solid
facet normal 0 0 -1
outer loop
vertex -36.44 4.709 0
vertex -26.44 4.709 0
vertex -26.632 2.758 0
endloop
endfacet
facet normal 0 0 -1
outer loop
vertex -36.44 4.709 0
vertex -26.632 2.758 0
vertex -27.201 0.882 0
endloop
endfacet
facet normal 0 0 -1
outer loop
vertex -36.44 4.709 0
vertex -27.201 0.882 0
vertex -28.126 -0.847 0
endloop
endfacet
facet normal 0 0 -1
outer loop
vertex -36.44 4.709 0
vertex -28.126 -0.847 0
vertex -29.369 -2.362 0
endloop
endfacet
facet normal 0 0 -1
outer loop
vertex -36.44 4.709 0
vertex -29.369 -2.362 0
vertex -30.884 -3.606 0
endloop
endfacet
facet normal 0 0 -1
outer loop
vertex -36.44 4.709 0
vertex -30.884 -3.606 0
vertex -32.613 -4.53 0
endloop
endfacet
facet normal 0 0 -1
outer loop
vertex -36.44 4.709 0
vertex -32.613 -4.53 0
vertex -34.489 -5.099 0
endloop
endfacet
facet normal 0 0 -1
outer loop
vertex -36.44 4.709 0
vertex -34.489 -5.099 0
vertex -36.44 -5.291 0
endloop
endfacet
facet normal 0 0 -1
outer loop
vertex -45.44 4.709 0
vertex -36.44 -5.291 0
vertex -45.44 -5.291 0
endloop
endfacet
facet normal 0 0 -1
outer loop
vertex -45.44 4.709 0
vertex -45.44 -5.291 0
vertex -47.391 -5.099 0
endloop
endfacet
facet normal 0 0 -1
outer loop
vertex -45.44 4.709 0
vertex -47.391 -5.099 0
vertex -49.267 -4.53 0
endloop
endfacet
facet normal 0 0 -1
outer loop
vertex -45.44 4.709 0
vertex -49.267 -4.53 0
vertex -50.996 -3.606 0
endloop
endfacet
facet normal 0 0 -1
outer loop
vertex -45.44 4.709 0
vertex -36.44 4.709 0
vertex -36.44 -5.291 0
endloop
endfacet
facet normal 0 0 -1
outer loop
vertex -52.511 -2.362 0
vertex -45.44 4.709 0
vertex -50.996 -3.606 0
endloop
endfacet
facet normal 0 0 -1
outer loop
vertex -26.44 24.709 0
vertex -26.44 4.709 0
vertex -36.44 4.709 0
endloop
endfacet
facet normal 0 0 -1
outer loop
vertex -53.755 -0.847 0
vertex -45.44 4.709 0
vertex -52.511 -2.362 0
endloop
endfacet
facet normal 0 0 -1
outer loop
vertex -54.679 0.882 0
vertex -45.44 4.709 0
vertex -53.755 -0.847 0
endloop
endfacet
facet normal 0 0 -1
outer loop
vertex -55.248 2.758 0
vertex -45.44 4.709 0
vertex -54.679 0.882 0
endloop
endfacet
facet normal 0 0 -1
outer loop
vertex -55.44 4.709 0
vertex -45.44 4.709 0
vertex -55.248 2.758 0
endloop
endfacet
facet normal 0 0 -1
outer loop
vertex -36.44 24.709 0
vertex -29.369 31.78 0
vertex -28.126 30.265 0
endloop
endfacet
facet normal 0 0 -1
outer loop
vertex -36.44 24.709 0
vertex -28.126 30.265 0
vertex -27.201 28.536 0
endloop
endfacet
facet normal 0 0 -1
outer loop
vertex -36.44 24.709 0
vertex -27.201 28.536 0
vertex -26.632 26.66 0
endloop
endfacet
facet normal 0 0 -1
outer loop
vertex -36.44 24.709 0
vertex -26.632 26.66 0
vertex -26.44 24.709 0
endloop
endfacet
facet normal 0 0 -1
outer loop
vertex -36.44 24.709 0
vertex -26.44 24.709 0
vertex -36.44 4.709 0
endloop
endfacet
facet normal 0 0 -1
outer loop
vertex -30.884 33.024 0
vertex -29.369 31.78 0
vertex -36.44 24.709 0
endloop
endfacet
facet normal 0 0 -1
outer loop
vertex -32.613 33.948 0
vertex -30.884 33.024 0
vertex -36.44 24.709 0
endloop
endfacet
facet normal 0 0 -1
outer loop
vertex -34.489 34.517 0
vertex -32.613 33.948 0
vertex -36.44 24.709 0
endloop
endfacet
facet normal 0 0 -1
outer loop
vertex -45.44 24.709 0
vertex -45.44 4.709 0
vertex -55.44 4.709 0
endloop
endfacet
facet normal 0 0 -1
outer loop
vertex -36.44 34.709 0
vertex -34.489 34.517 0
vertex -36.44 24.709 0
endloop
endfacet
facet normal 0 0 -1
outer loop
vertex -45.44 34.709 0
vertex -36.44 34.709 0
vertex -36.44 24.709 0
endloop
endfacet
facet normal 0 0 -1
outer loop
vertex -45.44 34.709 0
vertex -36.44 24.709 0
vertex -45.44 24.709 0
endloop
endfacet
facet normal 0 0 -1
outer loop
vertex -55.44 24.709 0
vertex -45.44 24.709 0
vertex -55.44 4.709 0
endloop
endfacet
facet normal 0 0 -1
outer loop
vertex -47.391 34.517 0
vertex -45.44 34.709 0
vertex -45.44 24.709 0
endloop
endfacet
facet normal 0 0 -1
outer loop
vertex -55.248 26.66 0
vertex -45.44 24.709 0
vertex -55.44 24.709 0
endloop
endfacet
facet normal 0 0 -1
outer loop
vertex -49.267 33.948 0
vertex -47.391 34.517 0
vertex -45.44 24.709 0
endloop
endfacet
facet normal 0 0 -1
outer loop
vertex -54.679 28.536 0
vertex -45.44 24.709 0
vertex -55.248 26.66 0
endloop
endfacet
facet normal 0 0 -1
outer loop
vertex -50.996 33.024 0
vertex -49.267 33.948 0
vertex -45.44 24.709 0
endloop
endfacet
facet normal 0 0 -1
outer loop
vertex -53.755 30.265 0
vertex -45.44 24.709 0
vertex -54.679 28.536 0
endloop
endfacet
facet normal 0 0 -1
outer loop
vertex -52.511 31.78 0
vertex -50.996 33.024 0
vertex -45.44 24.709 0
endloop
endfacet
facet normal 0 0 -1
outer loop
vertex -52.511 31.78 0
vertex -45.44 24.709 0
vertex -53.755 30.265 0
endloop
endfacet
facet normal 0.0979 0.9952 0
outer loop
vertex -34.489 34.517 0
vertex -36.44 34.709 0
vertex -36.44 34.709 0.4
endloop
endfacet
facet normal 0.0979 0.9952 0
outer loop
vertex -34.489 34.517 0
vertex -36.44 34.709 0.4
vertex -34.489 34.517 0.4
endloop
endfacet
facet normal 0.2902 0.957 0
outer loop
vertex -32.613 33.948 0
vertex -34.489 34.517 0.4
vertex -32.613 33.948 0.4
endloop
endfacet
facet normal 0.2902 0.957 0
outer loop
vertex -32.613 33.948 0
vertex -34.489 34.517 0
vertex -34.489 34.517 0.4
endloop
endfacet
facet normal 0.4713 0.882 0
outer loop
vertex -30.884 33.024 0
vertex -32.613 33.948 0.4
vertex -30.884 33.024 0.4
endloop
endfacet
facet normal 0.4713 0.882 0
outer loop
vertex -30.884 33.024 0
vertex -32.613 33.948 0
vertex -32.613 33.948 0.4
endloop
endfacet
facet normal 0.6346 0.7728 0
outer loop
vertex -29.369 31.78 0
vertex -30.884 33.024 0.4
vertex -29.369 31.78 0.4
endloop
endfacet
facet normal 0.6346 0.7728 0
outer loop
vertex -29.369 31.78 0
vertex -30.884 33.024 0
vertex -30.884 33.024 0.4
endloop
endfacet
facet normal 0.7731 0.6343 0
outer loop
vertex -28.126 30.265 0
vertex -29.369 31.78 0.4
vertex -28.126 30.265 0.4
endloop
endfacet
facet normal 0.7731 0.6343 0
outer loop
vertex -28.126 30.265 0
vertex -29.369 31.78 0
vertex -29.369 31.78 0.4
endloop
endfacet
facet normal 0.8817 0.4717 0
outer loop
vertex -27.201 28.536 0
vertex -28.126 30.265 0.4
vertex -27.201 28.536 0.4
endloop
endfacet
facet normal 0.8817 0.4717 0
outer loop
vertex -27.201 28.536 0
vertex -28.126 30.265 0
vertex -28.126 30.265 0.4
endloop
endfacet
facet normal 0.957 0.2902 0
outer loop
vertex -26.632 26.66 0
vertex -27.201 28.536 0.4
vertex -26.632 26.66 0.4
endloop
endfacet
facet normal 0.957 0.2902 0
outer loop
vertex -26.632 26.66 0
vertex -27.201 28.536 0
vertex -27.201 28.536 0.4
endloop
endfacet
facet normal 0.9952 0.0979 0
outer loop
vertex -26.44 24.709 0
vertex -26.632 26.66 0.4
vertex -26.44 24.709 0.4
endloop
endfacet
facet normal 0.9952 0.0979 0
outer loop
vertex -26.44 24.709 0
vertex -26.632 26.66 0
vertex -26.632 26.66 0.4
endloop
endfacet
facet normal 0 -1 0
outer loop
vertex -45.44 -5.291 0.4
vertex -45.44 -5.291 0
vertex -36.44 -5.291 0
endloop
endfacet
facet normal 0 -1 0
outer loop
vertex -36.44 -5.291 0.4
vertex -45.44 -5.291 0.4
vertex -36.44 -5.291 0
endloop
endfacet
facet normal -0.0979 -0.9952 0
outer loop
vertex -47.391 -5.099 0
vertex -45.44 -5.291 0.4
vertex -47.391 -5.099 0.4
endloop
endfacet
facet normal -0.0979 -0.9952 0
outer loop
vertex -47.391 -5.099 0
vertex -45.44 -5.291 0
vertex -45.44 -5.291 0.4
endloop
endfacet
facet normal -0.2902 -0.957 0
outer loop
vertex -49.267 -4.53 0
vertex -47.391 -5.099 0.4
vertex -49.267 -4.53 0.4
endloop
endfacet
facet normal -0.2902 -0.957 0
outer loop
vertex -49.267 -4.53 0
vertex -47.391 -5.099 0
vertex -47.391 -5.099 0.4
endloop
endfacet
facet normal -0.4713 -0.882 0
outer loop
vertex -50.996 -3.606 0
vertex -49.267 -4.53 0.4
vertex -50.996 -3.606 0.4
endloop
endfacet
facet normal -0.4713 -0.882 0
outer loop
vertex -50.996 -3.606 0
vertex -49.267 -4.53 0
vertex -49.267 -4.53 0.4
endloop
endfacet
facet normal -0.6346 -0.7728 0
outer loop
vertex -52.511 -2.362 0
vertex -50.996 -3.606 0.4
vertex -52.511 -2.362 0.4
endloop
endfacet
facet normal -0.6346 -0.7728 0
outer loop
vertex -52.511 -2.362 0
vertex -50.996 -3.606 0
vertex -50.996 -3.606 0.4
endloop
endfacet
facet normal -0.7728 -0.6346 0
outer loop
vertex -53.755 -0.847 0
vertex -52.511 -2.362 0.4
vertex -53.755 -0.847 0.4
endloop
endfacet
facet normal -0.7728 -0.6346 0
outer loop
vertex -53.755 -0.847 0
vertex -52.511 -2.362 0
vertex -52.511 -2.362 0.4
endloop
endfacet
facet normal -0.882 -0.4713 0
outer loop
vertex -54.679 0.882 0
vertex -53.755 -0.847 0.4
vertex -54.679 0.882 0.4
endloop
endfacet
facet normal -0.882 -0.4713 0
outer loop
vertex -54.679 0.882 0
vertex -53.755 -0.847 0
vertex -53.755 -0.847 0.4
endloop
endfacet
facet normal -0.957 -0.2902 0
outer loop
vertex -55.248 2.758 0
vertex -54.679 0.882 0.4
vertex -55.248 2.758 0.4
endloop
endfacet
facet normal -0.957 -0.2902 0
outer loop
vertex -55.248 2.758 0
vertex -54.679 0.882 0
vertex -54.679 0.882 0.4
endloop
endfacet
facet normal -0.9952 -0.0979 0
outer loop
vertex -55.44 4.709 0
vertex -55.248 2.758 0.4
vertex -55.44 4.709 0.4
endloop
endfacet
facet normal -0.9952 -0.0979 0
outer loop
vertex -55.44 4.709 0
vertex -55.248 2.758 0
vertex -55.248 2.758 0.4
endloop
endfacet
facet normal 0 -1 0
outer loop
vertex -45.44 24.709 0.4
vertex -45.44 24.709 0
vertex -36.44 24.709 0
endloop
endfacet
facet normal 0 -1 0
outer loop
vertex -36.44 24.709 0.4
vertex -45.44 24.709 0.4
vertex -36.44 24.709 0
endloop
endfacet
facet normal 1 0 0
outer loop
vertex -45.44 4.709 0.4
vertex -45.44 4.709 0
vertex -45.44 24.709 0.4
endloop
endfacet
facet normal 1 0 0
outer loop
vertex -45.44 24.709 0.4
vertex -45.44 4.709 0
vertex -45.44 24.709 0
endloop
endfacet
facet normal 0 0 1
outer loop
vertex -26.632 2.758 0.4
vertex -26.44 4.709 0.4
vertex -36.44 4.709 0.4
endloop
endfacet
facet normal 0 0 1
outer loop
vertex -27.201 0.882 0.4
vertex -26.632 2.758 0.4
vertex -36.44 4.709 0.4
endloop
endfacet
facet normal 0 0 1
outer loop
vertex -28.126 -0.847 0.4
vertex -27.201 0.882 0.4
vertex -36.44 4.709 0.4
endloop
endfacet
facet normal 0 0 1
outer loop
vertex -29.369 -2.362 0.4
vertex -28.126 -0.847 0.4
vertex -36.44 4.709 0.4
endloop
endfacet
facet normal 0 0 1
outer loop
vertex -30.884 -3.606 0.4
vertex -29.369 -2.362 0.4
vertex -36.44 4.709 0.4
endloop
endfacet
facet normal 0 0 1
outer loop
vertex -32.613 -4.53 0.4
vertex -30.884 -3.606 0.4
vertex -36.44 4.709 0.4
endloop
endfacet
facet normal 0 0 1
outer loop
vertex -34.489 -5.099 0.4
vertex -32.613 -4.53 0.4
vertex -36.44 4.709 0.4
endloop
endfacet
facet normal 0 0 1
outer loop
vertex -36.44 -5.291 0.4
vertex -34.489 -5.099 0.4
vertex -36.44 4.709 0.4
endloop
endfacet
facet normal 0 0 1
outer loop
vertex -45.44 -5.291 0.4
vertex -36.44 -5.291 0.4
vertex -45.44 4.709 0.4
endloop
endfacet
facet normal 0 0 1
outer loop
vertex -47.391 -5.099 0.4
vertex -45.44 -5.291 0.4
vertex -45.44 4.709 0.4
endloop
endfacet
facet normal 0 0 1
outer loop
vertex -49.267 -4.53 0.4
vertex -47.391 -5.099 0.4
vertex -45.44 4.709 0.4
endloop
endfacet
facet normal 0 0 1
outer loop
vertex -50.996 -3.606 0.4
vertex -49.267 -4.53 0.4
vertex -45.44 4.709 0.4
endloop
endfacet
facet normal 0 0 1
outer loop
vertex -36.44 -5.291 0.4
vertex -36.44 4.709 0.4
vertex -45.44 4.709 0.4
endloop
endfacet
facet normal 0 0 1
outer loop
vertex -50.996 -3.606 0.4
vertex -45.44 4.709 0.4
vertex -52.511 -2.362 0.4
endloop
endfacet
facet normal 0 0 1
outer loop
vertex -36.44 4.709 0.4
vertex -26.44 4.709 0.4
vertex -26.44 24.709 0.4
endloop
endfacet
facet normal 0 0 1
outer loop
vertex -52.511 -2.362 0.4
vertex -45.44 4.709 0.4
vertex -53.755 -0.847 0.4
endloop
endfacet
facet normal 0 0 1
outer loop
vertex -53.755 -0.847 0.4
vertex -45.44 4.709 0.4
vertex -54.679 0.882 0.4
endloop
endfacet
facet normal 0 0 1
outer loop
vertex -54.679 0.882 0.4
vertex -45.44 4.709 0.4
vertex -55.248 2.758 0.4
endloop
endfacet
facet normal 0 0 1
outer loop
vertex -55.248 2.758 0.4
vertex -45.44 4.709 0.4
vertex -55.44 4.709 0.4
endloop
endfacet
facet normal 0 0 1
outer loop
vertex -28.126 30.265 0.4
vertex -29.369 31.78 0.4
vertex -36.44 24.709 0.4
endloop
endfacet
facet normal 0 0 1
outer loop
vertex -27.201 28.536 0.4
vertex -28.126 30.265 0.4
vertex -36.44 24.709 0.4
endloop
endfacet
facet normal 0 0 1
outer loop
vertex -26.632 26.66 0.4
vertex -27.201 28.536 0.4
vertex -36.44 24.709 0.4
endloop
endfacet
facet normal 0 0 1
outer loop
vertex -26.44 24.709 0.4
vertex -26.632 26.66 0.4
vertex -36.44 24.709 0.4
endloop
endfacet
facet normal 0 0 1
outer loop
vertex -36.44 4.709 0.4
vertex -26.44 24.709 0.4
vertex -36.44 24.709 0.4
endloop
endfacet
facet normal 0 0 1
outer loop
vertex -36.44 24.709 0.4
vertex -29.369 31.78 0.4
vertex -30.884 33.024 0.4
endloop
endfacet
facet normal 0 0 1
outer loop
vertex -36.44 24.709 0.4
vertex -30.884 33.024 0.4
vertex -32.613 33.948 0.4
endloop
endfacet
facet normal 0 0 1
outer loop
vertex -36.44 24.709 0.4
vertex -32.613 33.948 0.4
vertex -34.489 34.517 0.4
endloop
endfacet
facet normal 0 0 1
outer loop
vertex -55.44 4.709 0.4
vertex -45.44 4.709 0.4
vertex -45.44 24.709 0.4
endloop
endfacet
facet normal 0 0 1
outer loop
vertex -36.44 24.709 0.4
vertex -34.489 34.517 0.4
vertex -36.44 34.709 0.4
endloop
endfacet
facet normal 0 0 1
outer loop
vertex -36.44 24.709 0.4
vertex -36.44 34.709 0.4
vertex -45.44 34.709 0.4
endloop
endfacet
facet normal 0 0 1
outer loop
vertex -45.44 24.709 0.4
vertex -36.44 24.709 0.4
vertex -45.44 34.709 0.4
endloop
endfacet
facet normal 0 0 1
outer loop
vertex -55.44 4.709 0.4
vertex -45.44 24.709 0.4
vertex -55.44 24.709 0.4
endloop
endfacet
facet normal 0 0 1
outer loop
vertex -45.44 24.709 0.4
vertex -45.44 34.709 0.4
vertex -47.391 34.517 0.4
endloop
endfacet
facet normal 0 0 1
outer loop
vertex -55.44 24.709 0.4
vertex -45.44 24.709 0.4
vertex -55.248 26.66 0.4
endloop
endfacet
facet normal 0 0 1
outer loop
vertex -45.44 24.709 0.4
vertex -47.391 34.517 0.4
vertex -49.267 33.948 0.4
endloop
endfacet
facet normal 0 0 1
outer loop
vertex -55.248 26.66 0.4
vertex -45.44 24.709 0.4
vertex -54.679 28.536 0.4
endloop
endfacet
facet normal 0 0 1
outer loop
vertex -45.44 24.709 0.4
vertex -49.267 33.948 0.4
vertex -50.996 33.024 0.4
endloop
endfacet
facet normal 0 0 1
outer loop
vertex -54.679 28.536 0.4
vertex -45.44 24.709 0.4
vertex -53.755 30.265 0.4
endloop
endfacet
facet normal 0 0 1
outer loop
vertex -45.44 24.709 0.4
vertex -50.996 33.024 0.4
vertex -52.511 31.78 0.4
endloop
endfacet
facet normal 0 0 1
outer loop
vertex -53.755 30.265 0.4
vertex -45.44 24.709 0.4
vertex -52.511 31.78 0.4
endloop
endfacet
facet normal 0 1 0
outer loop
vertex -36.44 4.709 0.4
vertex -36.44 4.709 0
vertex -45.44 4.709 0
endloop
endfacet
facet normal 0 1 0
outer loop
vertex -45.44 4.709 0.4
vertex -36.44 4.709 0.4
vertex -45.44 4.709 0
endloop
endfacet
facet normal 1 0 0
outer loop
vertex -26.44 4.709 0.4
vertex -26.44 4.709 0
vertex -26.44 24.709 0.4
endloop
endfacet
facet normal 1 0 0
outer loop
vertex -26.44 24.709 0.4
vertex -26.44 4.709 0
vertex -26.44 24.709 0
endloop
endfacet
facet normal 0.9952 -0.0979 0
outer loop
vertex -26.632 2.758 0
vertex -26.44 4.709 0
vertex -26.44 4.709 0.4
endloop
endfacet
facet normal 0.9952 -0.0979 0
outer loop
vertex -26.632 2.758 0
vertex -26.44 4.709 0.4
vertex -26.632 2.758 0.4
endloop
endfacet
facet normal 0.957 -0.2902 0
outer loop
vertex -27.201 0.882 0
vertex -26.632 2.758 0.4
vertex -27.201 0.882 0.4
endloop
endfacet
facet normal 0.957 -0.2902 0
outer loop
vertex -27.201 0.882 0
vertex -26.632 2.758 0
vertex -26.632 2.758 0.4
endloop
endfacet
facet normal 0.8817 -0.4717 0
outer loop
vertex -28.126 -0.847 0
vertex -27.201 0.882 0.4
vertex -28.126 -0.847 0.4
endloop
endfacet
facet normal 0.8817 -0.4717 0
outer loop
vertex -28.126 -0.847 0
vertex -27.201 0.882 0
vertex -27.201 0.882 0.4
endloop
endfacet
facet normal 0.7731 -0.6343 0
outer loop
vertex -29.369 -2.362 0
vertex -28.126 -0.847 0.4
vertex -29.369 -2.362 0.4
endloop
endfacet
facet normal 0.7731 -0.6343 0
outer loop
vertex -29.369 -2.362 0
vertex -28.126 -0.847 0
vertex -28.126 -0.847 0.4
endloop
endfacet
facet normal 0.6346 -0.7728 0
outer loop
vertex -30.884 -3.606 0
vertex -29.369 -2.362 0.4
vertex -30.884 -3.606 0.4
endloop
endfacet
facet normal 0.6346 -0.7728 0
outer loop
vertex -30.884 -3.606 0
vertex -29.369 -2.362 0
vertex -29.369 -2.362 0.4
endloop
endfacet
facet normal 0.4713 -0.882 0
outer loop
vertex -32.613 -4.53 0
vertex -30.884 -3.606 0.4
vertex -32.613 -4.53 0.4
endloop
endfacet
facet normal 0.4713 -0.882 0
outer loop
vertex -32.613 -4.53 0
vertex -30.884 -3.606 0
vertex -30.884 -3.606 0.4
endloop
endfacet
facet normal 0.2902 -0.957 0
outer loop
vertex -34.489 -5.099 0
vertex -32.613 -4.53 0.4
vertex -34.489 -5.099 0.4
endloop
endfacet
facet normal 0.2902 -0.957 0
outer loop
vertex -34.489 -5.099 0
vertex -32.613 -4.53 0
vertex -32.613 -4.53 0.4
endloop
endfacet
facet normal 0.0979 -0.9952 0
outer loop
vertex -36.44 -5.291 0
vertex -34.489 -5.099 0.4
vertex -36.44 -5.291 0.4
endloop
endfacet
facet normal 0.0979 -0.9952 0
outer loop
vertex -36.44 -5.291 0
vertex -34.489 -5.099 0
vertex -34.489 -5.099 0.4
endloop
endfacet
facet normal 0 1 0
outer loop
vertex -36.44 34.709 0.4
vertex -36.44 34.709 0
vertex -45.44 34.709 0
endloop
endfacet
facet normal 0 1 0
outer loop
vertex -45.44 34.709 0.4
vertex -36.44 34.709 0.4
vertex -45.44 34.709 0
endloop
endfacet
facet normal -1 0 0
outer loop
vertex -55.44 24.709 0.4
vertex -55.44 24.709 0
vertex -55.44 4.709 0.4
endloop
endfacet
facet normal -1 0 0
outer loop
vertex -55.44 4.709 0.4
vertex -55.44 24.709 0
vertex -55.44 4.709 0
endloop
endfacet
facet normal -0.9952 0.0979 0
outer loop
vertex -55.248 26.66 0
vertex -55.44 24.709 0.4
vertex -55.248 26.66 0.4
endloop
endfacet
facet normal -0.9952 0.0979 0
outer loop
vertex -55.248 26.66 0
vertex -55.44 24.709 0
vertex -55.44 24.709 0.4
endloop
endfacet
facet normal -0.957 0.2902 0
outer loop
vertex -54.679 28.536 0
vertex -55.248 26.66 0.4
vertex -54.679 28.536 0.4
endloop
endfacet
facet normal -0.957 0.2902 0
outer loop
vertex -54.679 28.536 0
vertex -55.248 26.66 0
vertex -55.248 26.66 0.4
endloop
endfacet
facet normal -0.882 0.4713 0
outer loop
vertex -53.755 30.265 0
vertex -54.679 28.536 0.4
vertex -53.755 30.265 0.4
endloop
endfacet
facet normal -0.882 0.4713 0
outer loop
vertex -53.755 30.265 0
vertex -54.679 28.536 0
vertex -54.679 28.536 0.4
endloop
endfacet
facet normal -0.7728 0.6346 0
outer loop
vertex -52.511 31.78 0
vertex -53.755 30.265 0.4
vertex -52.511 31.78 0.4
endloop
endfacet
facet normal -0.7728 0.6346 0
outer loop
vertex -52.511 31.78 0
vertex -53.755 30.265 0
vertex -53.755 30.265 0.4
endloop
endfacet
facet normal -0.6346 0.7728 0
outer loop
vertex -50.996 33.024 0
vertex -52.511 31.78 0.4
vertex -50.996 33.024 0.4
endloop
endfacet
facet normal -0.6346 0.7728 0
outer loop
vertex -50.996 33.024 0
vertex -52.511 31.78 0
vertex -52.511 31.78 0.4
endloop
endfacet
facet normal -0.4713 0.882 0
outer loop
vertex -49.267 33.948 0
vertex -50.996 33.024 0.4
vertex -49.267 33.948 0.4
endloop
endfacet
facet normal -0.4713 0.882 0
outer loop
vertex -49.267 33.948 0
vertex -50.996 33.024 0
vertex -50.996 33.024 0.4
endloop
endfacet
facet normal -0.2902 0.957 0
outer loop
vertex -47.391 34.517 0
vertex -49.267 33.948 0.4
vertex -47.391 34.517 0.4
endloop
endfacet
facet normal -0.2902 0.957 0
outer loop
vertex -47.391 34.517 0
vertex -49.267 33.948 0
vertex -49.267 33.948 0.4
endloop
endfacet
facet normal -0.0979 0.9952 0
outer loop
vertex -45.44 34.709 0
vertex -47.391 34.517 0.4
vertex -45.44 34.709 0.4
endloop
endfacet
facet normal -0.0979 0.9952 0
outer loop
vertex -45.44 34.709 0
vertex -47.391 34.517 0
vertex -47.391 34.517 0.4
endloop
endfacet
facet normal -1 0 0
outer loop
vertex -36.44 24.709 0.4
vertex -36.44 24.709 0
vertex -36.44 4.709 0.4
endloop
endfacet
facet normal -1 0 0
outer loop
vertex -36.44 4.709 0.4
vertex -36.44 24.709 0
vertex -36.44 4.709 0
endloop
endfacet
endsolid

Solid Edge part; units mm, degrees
sketch "Sketch1" plane through (0, 0, 0) normal (0, 0, 1) x (1, 0, 0)
  arc A0 (-55.4402, 24.709) -> (-45.4402, 34.709) centre (-45.4402, 24.709) cw
  line L0 (-36.4402, 34.709) -> (-45.4402, 34.709)
  arc A1 (-36.4402, 34.709) -> (-26.4402, 24.709) centre (-36.4402, 24.709) cw
  line L1 (-26.4402, 4.709) -> (-26.4402, 24.709)
  arc A2 (-26.4402, 4.709) -> (-36.4402, -5.291) centre (-36.4402, 4.709) cw
  line L2 (-45.4402, -5.291) -> (-36.4402, -5.291)
  arc A3 (-45.4402, -5.291) -> (-55.4402, 4.709) centre (-45.4402, 4.709) cw
  line L3 (-55.4402, 24.709) -> (-55.4402, 4.709)
  line L4 (-36.4402, 24.709) -> (-36.4402, 4.709)
  line L5 (-36.4402, 4.709) -> (-45.4402, 4.709)
  line L6 (-45.4402, 4.709) -> (-45.4402, 24.709)
  line L7 (-45.4402, 24.709) -> (-36.4402, 24.709)
  dimension "D1" = 10
extrude "Protrusion1" add sketch "Sketch1" along normal blind 0.4
properties material "Copper"
